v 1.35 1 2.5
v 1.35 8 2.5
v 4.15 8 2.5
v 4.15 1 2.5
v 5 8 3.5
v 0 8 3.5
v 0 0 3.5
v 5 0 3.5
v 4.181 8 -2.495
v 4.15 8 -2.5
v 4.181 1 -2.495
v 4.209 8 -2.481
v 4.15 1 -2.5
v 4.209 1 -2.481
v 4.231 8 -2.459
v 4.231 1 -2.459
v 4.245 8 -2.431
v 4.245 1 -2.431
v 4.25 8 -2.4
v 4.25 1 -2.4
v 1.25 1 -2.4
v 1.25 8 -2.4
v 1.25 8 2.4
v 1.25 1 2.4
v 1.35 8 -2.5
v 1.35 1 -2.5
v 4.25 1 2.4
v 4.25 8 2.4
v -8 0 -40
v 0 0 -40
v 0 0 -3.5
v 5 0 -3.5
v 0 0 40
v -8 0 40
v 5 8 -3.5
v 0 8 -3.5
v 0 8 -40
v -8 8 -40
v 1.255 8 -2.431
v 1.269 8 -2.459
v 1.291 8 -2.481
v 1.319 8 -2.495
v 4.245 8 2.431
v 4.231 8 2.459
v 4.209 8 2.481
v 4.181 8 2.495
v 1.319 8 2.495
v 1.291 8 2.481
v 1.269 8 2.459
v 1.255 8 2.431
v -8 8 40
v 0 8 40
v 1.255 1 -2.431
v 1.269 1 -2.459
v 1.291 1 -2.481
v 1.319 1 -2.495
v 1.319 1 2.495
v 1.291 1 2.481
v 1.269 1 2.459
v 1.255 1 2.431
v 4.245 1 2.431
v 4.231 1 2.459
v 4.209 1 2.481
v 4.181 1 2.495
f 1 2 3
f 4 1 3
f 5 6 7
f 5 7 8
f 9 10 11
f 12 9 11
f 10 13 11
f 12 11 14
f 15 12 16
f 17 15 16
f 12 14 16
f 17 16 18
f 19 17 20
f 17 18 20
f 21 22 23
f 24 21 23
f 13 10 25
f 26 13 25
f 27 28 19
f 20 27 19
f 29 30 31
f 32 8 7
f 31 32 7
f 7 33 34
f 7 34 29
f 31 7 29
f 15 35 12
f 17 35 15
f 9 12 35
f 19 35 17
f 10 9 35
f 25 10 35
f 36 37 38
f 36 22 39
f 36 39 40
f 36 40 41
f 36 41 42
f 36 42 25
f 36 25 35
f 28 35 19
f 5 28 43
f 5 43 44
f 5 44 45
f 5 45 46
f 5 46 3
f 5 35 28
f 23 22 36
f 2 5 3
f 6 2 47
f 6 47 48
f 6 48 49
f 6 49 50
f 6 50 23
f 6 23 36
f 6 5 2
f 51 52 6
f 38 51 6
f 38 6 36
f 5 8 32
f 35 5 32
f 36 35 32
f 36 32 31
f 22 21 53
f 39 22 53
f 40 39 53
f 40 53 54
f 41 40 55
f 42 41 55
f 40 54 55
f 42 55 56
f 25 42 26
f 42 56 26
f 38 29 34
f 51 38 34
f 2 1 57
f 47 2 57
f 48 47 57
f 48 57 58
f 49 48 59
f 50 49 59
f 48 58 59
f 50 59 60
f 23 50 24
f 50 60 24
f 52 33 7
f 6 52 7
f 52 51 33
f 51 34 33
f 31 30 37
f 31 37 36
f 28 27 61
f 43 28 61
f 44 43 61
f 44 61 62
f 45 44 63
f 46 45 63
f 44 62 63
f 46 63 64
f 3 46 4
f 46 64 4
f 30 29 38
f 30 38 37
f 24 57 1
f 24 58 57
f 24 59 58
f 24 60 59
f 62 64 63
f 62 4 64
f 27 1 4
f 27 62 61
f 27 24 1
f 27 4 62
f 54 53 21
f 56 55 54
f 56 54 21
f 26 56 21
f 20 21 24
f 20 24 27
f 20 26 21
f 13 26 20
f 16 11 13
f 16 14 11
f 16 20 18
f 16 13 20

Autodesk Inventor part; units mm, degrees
ref_plane "YZ Plane" through (0, 0, 0) normal (1, 0, 0) x (0, 1, 0)
ref_plane "XZ Plane" through (0, 0, 0) normal (0, 1, 0) x (-1, 0, 0)
ref_plane "XY Plane" through (0, 0, 0) normal (0, 0, 1) x (1, 0, 0)
sketch "Esquisse1" plane through (0, 0, 0) normal (0, 1, 0) x (-1, 0, 0)
  line L0 (0, 0) -> (8, 0)
  line L1 (8, 0) -> (8, -40)
  line L2 (8, -40) -> (0, -40)
  line L3 (0, -40) -> (0, 0)
  line L4 (0, 0) -> (8, 0)
  line L5 (8, 0) -> (8, 40)
  line L6 (8, 40) -> (0, 40)
  line L7 (0, 40) -> (0, 0)
  line L8 (0, 3.5) -> (-5, 3.5)
  line L9 (-5, 3.5) -> (-5, 0)
  line L10 (-5, 0) -> (0, 0)
  line L11 (0, 0) -> (0, 3.5)
  line L12 (-5, -3.5) -> (0, -3.5)
  line L13 (0, -3.5) -> (0, 0)
  line L14 (0, 0) -> (-5, 0)
  line L15 (-5, 0) -> (-5, -3.5)
  dimension "d0" = 40
  dimension "d1" = 40
  dimension "d2" = 8
  dimension "d3" = 8
  dimension "d4" = 3.5
  dimension "d5" = 3.5
  dimension "d6" = 5
  dimension "d7" = 5
extrude "Extrusion1" add sketch "Esquisse1" along normal blind 8
sketch "Esquisse2" plane through (0, 8, 0) normal (0, 1, 0) x (1, 0, 0)
  line L0 (4.25, 2.5) -> (1.25, 2.5)
  line L1 (1.25, 2.5) -> (1.25, -2.5)
  line L2 (1.25, -2.5) -> (4.25, -2.5)
  line L3 (4.25, -2.5) -> (4.25, 2.5)
  line L4 (0, 0) -> (3, 0)
  line L5 (3, -10) -> (3, 10)
  line L6 (1.25, -2.5) -> (4.25, 2.5)
  line L7 (4.25, 2.5) -> (1.25, 2.5)
  line L8 (4.25, -2.5) -> (1.25, 2.5)
  line L9 (-8, 40) -> (-8, -40) projected
  line L10 (0, 3.5) -> (0, 40) projected
  line L11 (0, 40) -> (-8, 40) projected
  line L12 (0, 40) -> (-8, 40)
  line L13 (-5.5, -39.9859) -> (-4, 40)
  line L14 (0, 0) -> (-4.75, 0.007)
  point P0 (4.25, 0)
  point P1 (2.75, 0)
  dimension "d7" = 5
  dimension "d15" = 0
  dimension "d10" = 5
  dimension "d11" = 3
  dimension "d33" = 40
  dimension "d34" = 2.5
  dimension "d35" = 7.5
extrude "Extrusion2" cut sketch "Esquisse2" against normal blind 7
fillet "Congé1" radius 0.1 1 edges at (1.25, 4.5, -2.5)
fillet "Congé2" radius 0.1 1 edges at (4.25, 4.5, -2.5)
fillet "Congé3" radius 0.1 1 edges at (4.25, 4.5, 2.5)
fillet "Congé4" radius 0.1 1 edges at (1.25, 4.5, 2.5)
properties part number "helicoptere"
